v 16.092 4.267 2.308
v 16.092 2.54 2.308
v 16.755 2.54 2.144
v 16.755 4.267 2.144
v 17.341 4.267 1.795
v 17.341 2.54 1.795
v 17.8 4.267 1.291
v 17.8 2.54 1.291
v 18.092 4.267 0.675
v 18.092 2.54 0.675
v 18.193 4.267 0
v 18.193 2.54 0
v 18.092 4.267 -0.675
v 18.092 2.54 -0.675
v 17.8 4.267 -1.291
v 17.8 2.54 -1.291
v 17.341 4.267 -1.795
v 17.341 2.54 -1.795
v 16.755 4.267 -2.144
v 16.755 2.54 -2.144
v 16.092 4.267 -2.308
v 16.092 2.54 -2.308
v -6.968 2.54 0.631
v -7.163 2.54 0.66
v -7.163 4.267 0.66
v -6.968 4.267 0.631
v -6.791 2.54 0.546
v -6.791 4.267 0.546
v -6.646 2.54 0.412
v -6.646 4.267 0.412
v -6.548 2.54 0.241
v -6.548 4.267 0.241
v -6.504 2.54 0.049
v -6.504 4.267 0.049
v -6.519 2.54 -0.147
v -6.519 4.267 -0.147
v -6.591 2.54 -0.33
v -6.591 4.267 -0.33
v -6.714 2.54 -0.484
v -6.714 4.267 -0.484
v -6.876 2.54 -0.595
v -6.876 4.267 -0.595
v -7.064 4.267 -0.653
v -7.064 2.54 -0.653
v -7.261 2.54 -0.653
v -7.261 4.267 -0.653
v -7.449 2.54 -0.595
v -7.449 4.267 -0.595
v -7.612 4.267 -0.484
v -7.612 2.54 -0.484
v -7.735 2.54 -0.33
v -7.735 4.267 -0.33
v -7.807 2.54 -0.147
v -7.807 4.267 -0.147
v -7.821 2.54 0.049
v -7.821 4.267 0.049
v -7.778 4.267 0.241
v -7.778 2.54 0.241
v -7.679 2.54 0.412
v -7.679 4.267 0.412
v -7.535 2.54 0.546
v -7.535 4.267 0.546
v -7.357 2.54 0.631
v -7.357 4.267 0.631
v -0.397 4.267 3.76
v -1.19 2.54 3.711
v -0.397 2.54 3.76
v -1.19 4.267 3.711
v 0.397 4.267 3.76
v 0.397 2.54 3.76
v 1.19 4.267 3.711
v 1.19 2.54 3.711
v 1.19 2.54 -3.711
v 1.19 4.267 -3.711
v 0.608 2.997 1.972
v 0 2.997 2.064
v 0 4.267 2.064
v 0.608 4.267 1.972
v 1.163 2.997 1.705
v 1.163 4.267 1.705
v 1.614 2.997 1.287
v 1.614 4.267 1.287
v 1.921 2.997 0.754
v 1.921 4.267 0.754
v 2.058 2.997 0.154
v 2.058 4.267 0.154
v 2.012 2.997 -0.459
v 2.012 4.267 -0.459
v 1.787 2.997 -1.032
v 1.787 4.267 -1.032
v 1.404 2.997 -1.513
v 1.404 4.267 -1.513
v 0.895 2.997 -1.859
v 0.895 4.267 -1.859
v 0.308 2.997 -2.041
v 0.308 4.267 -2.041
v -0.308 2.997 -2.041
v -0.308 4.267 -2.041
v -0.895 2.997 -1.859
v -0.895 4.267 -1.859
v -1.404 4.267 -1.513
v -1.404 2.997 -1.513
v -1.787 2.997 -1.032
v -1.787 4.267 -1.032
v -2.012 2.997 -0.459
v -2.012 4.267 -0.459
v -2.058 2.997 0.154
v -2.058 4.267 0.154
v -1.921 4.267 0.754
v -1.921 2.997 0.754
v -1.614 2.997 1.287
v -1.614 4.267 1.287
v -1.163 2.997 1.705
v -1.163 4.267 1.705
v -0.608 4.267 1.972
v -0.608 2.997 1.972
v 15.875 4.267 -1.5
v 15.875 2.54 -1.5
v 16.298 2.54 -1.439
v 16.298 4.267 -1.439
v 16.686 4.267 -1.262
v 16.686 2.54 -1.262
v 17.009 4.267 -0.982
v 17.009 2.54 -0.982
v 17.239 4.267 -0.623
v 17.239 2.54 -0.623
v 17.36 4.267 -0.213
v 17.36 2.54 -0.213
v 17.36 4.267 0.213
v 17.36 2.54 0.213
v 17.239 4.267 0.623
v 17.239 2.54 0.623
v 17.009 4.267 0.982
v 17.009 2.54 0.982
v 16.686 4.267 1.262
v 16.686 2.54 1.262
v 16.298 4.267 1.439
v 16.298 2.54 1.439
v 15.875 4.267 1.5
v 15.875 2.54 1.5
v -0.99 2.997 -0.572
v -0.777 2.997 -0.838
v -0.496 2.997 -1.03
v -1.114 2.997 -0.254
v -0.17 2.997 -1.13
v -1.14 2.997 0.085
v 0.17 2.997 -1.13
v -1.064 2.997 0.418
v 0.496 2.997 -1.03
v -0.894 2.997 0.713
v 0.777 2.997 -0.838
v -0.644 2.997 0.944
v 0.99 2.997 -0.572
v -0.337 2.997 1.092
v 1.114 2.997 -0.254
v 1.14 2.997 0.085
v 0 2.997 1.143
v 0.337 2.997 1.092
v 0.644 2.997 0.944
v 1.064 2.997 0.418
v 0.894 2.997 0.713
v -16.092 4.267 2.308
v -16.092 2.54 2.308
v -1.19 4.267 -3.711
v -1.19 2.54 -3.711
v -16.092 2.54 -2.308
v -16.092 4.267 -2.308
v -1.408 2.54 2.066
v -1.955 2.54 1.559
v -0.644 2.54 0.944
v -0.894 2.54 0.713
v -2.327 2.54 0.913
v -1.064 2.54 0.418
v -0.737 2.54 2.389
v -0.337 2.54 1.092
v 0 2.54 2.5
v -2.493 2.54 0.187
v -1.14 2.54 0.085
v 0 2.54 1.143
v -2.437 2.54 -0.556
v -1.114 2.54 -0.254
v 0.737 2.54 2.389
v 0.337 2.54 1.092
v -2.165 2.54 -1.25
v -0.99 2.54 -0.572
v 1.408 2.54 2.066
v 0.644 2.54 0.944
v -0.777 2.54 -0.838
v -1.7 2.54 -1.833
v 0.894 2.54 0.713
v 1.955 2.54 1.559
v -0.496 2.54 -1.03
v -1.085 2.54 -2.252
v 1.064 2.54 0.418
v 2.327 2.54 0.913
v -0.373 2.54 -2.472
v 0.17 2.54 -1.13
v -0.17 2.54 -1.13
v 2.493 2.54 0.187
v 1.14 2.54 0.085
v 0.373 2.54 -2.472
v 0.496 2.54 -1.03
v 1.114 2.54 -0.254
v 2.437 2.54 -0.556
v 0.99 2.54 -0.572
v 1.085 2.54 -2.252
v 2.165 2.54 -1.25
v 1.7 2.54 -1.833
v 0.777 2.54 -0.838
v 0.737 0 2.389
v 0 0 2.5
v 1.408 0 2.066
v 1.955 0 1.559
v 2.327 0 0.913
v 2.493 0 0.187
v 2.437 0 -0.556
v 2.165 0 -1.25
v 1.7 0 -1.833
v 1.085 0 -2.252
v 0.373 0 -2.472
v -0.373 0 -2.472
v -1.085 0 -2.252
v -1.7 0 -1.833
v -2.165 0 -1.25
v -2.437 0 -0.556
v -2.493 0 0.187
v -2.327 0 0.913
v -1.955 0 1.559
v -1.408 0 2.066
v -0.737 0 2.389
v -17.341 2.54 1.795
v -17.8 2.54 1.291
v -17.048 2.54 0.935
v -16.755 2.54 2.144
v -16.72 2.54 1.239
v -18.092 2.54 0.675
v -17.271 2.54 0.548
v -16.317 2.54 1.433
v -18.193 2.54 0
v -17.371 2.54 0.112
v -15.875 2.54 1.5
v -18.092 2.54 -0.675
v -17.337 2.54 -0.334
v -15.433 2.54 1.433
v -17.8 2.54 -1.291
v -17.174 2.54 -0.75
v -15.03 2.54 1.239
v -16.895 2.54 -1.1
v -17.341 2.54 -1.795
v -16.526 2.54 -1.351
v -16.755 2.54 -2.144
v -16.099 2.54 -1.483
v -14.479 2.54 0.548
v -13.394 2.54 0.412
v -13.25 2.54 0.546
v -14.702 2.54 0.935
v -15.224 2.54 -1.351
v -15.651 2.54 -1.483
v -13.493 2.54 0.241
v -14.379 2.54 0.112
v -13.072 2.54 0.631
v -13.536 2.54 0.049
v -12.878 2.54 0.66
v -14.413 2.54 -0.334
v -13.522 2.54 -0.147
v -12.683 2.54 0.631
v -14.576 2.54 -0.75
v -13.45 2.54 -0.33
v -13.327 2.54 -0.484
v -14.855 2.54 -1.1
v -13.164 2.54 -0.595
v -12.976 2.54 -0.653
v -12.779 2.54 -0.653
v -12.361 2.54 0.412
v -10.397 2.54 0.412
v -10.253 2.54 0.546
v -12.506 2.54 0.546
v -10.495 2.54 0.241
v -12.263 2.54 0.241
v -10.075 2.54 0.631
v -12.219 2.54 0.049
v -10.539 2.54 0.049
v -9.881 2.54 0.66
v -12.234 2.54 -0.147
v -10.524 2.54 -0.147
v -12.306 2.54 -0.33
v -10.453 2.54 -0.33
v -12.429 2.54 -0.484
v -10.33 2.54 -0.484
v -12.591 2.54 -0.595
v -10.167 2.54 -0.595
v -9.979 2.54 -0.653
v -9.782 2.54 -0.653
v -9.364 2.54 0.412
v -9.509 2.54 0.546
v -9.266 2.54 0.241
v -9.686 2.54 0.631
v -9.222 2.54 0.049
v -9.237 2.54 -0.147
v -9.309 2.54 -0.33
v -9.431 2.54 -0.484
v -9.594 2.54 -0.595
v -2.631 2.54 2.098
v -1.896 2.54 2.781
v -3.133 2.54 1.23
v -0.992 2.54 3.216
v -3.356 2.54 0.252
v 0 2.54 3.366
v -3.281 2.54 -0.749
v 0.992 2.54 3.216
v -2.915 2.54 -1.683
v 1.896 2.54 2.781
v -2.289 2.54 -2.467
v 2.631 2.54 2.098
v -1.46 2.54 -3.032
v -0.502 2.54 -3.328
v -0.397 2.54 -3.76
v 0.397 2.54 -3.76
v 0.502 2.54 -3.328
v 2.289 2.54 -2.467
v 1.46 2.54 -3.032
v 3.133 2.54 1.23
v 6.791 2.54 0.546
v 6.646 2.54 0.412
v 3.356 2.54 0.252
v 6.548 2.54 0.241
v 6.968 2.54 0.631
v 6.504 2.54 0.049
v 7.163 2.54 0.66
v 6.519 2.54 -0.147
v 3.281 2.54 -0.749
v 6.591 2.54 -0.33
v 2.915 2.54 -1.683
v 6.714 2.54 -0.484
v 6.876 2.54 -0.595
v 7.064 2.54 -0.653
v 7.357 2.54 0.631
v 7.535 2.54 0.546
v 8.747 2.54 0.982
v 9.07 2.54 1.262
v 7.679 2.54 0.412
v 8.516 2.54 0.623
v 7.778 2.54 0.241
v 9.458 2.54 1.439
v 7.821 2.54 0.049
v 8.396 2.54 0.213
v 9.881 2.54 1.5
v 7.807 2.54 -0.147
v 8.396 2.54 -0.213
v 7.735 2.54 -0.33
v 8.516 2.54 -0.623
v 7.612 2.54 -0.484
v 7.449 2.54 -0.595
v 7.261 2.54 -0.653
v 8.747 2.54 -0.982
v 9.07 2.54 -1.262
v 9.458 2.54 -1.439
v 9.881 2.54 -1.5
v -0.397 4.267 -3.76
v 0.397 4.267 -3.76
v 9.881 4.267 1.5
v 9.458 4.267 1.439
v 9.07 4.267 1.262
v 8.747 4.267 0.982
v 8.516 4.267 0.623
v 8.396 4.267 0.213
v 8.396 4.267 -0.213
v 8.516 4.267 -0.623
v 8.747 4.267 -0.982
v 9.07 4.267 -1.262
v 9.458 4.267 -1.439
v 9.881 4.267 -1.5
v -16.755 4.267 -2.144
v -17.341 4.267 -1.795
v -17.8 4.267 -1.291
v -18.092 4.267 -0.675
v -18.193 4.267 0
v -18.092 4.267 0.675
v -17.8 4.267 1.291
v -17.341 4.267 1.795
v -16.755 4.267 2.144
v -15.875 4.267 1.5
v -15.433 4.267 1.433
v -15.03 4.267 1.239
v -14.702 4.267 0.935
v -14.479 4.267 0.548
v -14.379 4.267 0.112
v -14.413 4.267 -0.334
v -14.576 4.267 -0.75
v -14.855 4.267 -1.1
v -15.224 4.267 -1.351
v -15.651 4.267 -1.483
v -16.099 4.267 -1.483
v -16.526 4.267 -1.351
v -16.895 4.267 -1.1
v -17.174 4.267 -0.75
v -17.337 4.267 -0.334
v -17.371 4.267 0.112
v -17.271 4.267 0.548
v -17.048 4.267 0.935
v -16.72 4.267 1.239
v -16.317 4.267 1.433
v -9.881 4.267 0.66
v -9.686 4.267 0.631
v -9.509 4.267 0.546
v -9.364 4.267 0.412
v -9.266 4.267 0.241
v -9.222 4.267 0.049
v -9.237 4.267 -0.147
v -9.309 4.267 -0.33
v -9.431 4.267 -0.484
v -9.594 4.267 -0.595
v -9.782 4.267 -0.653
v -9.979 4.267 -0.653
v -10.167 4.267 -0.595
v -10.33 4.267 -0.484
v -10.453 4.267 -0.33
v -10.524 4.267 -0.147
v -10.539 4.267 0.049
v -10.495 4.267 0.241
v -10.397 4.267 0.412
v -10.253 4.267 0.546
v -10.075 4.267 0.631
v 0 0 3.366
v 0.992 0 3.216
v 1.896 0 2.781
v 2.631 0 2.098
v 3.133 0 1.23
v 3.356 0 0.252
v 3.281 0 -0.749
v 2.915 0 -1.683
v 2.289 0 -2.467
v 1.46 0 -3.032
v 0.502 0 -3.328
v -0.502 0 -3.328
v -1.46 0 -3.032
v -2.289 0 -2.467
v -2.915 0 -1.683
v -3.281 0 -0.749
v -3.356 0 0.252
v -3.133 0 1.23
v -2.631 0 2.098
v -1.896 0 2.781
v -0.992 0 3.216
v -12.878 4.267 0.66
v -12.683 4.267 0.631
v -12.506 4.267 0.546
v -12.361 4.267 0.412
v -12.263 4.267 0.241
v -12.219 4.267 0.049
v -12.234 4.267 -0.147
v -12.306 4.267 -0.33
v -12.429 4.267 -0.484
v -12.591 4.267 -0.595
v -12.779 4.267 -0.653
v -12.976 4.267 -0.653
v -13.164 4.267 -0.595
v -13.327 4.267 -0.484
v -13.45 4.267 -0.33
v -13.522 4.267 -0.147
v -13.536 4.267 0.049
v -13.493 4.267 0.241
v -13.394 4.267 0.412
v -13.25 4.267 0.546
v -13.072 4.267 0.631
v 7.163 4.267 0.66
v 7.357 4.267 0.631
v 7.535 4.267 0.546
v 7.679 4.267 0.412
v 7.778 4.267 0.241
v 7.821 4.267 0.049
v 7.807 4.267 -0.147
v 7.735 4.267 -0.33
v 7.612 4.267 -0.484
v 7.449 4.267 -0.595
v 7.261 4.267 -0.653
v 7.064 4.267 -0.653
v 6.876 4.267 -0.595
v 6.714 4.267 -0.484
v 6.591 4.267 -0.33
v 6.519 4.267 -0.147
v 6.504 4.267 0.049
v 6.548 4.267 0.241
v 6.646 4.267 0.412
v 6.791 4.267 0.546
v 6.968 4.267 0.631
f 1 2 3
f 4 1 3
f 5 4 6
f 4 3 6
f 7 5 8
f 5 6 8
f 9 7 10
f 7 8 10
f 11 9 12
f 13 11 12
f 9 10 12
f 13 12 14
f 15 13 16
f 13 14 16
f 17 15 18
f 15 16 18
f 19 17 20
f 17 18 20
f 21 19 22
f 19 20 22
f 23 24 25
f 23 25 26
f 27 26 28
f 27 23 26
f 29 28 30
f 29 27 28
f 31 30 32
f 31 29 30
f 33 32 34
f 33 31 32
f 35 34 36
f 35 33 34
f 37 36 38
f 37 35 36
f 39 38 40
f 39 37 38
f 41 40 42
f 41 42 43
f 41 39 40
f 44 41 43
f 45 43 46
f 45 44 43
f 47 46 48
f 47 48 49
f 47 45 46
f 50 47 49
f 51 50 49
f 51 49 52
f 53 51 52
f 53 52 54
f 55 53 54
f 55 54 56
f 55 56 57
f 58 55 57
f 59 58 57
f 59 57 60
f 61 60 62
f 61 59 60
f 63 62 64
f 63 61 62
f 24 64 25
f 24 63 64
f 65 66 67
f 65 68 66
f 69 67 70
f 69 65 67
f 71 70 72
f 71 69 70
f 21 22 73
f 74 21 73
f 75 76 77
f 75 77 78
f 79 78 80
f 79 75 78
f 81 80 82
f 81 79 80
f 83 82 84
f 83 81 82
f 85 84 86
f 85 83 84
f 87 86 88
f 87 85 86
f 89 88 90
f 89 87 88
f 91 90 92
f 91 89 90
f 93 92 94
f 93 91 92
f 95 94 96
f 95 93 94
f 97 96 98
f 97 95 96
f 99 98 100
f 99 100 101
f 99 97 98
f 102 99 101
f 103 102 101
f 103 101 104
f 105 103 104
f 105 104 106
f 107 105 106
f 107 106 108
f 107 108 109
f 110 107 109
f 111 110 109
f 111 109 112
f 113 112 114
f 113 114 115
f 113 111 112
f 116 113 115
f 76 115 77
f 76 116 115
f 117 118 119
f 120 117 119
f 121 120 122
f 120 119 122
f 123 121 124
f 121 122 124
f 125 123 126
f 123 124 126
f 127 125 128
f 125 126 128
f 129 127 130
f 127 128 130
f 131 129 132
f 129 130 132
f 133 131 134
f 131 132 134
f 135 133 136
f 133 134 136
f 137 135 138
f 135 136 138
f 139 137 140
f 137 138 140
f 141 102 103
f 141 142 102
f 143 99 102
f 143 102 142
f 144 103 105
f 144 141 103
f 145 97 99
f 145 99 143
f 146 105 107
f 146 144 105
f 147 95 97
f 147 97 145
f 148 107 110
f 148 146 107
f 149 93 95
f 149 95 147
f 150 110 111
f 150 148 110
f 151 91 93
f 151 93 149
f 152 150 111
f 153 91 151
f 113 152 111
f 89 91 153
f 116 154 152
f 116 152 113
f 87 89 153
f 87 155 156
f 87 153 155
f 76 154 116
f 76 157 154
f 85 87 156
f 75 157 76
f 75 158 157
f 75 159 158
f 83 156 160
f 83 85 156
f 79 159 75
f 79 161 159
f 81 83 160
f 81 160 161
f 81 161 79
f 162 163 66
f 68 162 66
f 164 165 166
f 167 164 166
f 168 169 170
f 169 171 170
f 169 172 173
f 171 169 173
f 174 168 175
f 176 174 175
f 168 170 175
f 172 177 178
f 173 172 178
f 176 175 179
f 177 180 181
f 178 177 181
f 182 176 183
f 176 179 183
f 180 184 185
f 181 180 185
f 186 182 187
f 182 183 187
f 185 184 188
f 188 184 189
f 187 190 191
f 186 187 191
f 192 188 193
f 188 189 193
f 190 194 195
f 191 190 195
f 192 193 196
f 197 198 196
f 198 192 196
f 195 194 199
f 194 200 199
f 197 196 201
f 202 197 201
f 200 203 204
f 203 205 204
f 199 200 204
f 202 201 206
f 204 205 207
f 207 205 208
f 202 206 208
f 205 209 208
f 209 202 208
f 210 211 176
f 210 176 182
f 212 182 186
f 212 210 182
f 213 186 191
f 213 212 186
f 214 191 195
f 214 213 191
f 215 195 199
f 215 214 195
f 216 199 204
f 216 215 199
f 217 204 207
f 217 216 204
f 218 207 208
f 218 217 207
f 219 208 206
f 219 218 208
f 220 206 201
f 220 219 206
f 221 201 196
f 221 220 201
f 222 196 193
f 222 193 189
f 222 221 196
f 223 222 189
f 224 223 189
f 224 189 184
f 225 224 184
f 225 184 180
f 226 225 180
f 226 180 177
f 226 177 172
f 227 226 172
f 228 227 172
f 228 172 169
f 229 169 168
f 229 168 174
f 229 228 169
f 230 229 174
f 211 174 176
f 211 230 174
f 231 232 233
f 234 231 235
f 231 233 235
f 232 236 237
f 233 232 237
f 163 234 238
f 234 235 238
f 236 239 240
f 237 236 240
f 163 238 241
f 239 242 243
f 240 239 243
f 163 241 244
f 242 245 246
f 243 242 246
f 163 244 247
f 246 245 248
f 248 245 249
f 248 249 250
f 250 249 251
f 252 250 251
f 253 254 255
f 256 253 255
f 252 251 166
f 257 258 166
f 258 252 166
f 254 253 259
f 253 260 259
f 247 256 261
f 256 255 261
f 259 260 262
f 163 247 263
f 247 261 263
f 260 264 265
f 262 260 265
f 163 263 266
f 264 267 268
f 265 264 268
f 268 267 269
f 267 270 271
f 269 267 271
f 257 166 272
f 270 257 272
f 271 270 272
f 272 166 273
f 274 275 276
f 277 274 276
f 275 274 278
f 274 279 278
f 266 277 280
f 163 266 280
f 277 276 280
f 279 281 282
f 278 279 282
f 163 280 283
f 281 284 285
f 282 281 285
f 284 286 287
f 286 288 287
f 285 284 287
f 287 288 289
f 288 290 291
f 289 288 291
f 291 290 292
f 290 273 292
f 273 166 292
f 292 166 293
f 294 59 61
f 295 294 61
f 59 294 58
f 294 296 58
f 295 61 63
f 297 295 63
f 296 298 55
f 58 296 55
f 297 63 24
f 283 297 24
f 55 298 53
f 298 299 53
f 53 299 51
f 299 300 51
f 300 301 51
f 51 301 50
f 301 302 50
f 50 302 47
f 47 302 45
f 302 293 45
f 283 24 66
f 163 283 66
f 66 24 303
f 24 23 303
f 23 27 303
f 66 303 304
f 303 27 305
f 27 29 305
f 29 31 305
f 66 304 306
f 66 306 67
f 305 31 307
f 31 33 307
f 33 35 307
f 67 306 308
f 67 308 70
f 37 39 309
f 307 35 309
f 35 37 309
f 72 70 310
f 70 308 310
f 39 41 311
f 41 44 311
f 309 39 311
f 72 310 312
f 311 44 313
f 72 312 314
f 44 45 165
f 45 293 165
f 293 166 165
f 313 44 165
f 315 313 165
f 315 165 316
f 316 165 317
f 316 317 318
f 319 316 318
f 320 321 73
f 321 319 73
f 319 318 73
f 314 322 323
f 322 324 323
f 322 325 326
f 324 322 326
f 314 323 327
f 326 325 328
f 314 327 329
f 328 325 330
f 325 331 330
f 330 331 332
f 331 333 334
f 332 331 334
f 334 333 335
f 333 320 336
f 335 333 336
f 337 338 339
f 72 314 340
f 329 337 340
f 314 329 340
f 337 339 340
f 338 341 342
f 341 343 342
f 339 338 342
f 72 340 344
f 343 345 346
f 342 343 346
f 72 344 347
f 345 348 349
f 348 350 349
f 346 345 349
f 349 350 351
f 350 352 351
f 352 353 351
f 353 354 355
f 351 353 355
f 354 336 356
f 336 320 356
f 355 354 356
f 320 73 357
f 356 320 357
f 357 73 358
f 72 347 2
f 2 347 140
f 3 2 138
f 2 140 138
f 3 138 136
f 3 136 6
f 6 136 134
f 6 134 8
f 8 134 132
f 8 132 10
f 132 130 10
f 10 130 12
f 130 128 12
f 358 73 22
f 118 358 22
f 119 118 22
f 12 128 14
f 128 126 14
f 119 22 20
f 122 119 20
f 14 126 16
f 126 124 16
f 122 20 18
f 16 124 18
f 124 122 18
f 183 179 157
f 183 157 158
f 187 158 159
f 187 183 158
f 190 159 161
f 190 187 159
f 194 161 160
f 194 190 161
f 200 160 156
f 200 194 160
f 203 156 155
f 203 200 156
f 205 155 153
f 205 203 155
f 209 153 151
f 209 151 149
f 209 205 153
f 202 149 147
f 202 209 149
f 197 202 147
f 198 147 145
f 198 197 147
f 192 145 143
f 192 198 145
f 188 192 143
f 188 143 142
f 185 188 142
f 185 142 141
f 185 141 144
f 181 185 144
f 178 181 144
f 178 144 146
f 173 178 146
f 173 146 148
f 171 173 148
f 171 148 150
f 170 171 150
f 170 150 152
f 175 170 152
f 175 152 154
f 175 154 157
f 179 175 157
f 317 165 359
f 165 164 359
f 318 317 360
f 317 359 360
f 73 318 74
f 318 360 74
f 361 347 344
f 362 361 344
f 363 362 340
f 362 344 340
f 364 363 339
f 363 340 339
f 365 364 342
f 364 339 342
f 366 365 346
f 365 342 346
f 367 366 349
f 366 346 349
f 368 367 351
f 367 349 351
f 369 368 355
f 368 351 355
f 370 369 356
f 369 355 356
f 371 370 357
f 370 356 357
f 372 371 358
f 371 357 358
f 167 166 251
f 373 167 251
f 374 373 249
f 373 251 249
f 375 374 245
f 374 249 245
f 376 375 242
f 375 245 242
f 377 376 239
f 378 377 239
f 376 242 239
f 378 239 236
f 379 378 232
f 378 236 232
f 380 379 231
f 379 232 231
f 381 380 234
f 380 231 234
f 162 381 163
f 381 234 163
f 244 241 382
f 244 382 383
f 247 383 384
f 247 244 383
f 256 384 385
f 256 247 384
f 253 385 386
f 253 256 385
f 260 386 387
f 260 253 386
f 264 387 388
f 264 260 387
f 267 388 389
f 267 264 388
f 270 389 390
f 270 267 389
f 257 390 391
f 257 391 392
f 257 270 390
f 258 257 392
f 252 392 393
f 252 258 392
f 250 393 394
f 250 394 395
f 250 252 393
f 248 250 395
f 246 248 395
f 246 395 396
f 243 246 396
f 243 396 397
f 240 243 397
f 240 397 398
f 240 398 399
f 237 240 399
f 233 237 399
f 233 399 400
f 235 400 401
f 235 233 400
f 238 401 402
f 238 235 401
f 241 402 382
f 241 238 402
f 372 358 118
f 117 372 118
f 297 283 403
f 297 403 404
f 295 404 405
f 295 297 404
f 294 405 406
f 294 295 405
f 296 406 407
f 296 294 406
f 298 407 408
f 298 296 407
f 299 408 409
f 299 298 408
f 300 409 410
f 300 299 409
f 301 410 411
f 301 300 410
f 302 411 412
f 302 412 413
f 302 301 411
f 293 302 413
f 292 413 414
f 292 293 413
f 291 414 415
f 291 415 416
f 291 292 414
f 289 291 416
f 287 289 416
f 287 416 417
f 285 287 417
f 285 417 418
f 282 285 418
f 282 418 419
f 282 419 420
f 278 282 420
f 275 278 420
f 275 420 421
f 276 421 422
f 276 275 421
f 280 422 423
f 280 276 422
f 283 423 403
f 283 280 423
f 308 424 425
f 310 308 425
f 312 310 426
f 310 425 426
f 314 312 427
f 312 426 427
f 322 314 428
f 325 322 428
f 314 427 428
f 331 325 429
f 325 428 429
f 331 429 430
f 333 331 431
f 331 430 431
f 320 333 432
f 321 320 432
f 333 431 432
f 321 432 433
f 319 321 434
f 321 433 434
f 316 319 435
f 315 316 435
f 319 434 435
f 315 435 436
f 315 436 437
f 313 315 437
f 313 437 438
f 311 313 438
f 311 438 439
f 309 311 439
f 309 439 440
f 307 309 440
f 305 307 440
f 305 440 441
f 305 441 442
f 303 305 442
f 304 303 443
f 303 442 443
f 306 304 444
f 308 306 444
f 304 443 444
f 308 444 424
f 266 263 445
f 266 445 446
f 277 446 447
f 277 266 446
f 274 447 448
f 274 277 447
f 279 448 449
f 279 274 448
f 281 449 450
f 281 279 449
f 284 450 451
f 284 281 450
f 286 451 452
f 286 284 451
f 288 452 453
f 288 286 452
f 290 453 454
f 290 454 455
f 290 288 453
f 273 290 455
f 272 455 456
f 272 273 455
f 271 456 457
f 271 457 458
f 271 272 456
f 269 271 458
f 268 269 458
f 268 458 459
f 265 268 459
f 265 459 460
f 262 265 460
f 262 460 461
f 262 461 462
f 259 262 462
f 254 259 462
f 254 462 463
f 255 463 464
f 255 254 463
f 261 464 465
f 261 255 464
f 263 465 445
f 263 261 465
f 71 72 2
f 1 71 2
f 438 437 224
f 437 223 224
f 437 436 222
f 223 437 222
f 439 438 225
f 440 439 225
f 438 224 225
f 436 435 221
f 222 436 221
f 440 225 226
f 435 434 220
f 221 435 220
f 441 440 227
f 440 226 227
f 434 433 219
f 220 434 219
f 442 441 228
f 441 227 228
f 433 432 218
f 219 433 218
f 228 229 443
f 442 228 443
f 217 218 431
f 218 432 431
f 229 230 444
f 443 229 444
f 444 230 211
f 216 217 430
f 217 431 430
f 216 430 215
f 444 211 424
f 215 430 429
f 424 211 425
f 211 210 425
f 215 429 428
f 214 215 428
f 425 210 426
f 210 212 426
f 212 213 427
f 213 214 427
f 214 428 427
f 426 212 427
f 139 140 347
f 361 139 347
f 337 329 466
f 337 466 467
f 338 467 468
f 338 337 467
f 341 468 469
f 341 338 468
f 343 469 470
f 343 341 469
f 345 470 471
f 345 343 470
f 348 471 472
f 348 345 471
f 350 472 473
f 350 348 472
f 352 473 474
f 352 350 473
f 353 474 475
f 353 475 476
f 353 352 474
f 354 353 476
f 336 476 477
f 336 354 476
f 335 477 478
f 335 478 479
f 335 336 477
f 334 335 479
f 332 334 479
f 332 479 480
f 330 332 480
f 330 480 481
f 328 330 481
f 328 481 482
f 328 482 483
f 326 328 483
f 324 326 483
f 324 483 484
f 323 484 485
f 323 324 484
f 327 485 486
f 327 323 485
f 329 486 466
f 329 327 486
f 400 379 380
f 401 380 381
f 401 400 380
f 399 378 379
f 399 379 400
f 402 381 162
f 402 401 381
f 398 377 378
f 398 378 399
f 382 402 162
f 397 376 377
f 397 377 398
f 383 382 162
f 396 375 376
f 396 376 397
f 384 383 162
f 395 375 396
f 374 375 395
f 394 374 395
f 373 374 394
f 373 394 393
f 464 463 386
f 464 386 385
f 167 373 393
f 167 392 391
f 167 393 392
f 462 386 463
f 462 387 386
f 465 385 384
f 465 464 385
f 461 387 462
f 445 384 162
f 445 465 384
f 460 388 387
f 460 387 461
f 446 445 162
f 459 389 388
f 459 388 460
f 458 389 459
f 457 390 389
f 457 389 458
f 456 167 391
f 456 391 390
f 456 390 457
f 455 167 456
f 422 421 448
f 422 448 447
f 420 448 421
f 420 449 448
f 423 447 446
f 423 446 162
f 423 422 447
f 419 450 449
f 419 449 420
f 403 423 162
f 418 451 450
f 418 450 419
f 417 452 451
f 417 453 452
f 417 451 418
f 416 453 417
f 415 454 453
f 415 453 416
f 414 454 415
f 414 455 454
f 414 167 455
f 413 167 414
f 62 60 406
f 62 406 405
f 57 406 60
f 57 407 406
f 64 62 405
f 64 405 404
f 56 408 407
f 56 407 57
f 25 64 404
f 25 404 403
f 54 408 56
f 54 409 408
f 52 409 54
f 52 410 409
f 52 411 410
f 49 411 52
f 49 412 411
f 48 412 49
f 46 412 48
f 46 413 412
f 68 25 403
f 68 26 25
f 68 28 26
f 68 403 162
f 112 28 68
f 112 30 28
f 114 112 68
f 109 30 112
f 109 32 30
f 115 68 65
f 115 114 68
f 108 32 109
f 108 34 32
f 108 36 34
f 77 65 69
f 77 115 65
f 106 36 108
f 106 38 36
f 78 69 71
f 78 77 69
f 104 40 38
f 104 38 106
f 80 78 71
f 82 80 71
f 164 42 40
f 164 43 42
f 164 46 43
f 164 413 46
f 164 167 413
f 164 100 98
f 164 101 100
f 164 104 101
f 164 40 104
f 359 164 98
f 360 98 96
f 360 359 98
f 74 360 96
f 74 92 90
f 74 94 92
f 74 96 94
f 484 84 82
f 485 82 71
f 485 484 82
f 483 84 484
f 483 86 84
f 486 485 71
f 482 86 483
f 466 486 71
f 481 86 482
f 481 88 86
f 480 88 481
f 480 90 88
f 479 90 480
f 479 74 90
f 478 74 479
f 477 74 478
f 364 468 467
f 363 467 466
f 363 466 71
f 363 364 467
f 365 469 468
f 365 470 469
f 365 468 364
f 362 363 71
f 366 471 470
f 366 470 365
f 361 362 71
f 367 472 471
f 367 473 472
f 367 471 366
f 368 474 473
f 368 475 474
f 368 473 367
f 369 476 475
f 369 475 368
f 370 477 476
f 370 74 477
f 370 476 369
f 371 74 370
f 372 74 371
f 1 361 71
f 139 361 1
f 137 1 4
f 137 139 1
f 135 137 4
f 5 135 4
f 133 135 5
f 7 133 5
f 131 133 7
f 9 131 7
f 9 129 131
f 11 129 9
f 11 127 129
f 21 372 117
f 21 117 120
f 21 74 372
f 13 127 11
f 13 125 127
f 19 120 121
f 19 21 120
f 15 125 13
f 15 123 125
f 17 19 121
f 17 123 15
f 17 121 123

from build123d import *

# Parameters (mm, degrees)
SKETCH1_R           = 3.3655
SKETCH1_R_2         = 2.5
BOSS_EXTRUDE1_DEPTH = 2.54
SKETCH2_R           = 1.143
SKETCH2_R_2         = 0.6604
SKETCH2_R_3         = 1.5
BOSS_EXTRUDE2_DEPTH = 1.7272
FILLET1_R           = 12.7
CUT_EXTRUDE1_START  = -1.27
SKETCH3_R           = 2.06375
SKETCH3_R_2         = 1.143
CUT_EXTRUDE1_DEPTH  = 1.27


with BuildPart() as part:
    # Sketch1 → Boss-Extrude1 (new body)
    with BuildSketch(Plane(origin=(0, 0, 0), x_dir=(1, 0, 0), z_dir=(0, 1, 0))):
        with Locations(Location((0, 0, 0), (0, 0, 270))):
            Circle(SKETCH1_R)
        with Locations(Location((0, 0, 0), (0, 0, 270))):
            Circle(SKETCH1_R_2, mode=Mode.SUBTRACT)
    extrude(amount=BOSS_EXTRUDE1_DEPTH)

    # Sketch2 → Boss-Extrude2 (add)
    with BuildSketch(Plane(origin=(0, 2.54, 0), x_dir=(1, 0, 0), z_dir=(0, 1, 0))):
        with BuildLine():
            Line((0, 3.8227), (-16.092265178, 2.307544345))
            ThreePointArc((-16.092265178, 2.307544345), (-18.19275, 0), (-16.092265178, -2.307544345))
            Line((-16.092265178, -2.307544345), (0, -3.8227))
            Line((0, -3.8227), (16.092265178, -2.307544345))
            ThreePointArc((16.092265178, -2.307544345), (18.19275, 0), (16.092265178, 2.307544345))
            Line((16.092265178, 2.307544345), (0, 3.8227))
        make_face()
        with BuildLine():
            ThreePointArc((9.8806, -1.5), (8.3806, 0), (9.8806, 1.5))
            Line((9.8806, 1.5), (15.875, 1.5))
            ThreePointArc((15.875, 1.5), (17.375, 0), (15.875, -1.5))
            Line((15.875, -1.5), (9.8806, -1.5))
        make_face(mode=Mode.SUBTRACT)
        with Locations(Location((0, 0, 0), (0, 0, 270))):
            Circle(SKETCH2_R, mode=Mode.SUBTRACT)
        with Locations(Location((7.1628, 0, 0), (0, 0, 270))):
            Circle(SKETCH2_R_2, mode=Mode.SUBTRACT)
        with Locations(Location((-7.1628, 0, 0), (0, 0, 270))):
            Circle(SKETCH2_R_2, mode=Mode.SUBTRACT)
        with Locations(Location((-12.8778, 0, 0), (0, 0, 270))):
            Circle(SKETCH2_R_2, mode=Mode.SUBTRACT)
        with Locations(Location((-9.8806, 0, 0), (0, 0, 270))):
            Circle(SKETCH2_R_2, mode=Mode.SUBTRACT)
        with Locations(Location((-15.875, 0, 0), (0, 0, 270))):
            Circle(SKETCH2_R_3, mode=Mode.SUBTRACT)
    extrude(amount=BOSS_EXTRUDE2_DEPTH)

    # Fillet1
    fillet1_edges = [part.edges().sort_by_distance(p)[0] for p in [
        (0, 3.4036, 3.8227),
        (0, 3.4036, -3.8227),
    ]]
    fillet(fillet1_edges, radius=FILLET1_R)

    # Sketch3 → Cut-Extrude1 (cut)
    with BuildSketch(Plane(origin=(0, 4.2672, 0), x_dir=(1, 0, 0), z_dir=(0, 1, 0)).offset(CUT_EXTRUDE1_START)):
        with Locations(Location((0, 0, 0), (0, 0, 270))):
            Circle(SKETCH3_R)
        with Locations(Location((0, 0, 0), (0, 0, 270))):
            Circle(SKETCH3_R_2, mode=Mode.SUBTRACT)
    extrude(amount=CUT_EXTRUDE1_DEPTH, mode=Mode.SUBTRACT)


solid = part.part
